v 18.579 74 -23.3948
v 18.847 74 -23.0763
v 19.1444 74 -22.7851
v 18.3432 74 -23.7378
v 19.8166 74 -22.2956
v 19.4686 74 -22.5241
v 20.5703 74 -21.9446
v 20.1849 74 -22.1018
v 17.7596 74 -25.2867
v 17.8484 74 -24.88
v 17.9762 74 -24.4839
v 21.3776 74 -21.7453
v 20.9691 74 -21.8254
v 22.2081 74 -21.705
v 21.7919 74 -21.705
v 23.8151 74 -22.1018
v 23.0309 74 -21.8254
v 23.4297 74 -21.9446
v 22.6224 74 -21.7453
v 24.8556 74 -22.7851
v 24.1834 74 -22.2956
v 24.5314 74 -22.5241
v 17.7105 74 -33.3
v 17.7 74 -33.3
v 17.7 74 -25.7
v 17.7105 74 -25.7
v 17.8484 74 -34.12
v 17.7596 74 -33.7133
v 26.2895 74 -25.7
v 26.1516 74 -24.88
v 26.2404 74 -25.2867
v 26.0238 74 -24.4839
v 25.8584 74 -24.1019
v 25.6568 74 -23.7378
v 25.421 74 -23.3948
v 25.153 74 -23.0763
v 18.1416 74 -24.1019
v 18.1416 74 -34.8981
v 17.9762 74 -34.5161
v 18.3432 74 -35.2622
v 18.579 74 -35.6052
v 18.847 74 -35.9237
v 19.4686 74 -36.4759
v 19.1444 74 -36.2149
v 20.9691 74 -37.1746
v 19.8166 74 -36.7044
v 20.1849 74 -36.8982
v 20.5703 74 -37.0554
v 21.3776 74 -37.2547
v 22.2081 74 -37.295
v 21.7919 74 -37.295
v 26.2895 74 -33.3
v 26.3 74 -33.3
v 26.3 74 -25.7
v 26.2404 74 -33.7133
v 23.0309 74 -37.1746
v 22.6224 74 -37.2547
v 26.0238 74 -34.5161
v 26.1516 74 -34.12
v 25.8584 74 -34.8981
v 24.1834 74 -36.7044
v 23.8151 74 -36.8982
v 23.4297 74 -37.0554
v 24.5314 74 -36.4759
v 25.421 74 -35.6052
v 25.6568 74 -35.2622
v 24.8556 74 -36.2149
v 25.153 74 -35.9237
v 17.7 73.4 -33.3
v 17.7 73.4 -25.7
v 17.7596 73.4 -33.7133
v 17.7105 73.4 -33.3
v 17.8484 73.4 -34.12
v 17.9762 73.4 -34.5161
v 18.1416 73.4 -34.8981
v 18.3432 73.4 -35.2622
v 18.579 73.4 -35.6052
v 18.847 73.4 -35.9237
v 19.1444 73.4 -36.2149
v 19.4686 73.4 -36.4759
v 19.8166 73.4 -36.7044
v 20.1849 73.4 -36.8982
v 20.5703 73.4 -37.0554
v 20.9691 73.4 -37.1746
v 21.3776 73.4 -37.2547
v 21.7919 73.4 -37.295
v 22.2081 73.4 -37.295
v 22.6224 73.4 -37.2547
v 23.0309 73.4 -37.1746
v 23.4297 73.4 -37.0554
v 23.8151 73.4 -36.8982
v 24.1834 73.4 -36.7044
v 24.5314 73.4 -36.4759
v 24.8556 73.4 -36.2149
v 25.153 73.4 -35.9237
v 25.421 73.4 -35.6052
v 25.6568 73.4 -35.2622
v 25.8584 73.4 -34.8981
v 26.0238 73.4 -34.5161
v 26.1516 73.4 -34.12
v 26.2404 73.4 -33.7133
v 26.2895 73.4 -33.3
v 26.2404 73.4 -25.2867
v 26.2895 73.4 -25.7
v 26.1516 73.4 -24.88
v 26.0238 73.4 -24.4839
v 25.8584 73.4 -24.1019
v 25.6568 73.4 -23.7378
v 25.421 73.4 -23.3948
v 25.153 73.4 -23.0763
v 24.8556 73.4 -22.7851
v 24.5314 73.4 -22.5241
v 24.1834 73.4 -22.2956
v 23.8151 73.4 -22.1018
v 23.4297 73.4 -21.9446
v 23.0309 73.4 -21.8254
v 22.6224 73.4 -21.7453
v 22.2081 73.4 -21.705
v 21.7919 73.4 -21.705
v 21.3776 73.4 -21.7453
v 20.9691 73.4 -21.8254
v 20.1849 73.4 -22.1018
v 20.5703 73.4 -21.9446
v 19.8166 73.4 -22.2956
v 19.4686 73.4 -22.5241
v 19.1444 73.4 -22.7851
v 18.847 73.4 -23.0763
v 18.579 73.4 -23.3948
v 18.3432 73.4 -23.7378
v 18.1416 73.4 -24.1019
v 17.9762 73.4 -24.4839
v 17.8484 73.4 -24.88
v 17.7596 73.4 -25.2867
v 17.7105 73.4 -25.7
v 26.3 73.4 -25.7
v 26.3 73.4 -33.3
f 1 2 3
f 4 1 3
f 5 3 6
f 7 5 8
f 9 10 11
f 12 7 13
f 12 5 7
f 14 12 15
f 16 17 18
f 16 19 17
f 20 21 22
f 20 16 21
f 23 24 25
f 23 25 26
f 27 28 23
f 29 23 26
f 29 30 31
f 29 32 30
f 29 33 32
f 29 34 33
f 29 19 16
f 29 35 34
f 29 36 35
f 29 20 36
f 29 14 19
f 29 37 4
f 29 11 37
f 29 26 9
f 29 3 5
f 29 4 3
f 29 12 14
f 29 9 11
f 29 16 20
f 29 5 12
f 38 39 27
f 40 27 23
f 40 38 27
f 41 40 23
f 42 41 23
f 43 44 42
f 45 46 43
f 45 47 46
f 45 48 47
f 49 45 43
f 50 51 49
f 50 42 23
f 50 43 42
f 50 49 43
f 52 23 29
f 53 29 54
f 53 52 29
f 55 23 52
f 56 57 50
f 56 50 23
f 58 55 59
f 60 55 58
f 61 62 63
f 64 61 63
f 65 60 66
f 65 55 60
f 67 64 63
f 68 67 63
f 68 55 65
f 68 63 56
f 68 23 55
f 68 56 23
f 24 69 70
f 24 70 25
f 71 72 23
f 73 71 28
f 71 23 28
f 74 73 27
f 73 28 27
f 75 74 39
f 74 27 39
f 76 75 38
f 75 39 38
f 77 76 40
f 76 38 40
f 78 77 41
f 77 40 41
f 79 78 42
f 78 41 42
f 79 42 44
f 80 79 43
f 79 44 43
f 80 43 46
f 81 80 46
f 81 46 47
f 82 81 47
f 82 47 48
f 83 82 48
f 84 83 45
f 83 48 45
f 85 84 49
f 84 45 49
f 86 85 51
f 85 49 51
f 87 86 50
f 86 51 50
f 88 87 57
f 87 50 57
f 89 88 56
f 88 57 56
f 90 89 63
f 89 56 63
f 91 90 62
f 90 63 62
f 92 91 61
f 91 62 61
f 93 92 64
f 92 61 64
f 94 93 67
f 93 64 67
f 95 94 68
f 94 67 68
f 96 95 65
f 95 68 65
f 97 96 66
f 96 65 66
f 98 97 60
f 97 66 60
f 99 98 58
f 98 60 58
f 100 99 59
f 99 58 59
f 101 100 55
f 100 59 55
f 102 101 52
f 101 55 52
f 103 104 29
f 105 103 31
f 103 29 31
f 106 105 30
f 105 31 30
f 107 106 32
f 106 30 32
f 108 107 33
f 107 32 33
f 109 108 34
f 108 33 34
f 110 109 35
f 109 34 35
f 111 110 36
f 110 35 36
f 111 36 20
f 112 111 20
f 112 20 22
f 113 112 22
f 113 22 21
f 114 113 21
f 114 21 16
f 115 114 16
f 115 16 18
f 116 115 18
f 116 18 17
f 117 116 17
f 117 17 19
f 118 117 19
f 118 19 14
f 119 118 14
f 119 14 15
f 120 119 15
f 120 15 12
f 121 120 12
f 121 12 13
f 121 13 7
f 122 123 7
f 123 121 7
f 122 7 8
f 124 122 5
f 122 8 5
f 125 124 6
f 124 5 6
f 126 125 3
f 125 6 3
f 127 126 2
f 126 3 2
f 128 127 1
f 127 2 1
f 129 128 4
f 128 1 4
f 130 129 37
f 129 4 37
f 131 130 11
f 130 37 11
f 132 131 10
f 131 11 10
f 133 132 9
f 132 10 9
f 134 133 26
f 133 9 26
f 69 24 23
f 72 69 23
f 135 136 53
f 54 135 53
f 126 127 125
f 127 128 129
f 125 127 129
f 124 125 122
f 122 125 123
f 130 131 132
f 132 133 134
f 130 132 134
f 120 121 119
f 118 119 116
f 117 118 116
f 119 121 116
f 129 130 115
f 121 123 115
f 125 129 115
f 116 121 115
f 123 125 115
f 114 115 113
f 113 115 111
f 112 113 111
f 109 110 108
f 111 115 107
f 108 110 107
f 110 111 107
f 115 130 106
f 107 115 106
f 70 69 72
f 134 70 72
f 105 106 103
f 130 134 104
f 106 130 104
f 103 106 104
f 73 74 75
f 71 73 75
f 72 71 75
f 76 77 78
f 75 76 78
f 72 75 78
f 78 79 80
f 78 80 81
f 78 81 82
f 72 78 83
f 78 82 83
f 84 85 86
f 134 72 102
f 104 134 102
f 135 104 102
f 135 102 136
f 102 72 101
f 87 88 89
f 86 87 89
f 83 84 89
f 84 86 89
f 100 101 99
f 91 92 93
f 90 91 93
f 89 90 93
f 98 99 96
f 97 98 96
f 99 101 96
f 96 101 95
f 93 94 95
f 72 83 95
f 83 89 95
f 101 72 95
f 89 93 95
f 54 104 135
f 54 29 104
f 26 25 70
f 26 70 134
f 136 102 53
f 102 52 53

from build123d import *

# Parameters (mm, degrees)
BOX012_W          = 20
BOX012_H          = 20
BOX012_DEPTH      = 20
BOX011_W          = 8.6
BOX011_H          = 14
BOX011_DEPTH      = 7.6
CYLINDER021_R     = 4.3
CYLINDER021_DEPTH = 10
CYLINDER020_R     = 4.3
CYLINDER020_DEPTH = 10


with BuildPart() as cube012:
    # Box012 → Box012 (new body)
    with BuildSketch(Plane(origin=(10, 53.4, -39), x_dir=(1, 0, 0), z_dir=(0, 0, 1))):
        with Locations((10, 10)):
            Rectangle(BOX012_W, BOX012_H)
    extrude(amount=BOX012_DEPTH)


with BuildPart() as cube011:
    # Box011 → Box011 (new body)
    with BuildSketch(Plane(origin=(17.7, 59, -33.3), x_dir=(1, 0, 0), z_dir=(0, 0, 1))):
        with Locations((4.3, 7)):
            Rectangle(BOX011_W, BOX011_H)
    extrude(amount=BOX011_DEPTH)


with BuildPart() as cylinder021:
    # Cylinder021 → Cylinder021 (new body)
    with BuildSketch(Plane(origin=(22, 73, -26), x_dir=(1, 0, 0), z_dir=(0, -1, 0))):
        Circle(CYLINDER021_R)
    extrude(amount=CYLINDER021_DEPTH)


with BuildPart() as tapita:
    # Cylinder020 → Cylinder020 (new body)
    with BuildSketch(Plane(origin=(22, 73, -33), x_dir=(1, 0, 0), z_dir=(0, -1, 0))):
        Circle(CYLINDER020_R)
    extrude(amount=CYLINDER020_DEPTH)

    # Fusion021: union Cube011, Cylinder021
    add(cube011.part)
    add(cylinder021.part)


with BuildPart() as tapita_1:
    # Fusion021 placement: moved
    add(tapita.part.moved(Location((0, 1, 0))))

    # Cut007002: cut Cube012
    add(cube012.part, mode=Mode.SUBTRACT)


solid = tapita_1.part
